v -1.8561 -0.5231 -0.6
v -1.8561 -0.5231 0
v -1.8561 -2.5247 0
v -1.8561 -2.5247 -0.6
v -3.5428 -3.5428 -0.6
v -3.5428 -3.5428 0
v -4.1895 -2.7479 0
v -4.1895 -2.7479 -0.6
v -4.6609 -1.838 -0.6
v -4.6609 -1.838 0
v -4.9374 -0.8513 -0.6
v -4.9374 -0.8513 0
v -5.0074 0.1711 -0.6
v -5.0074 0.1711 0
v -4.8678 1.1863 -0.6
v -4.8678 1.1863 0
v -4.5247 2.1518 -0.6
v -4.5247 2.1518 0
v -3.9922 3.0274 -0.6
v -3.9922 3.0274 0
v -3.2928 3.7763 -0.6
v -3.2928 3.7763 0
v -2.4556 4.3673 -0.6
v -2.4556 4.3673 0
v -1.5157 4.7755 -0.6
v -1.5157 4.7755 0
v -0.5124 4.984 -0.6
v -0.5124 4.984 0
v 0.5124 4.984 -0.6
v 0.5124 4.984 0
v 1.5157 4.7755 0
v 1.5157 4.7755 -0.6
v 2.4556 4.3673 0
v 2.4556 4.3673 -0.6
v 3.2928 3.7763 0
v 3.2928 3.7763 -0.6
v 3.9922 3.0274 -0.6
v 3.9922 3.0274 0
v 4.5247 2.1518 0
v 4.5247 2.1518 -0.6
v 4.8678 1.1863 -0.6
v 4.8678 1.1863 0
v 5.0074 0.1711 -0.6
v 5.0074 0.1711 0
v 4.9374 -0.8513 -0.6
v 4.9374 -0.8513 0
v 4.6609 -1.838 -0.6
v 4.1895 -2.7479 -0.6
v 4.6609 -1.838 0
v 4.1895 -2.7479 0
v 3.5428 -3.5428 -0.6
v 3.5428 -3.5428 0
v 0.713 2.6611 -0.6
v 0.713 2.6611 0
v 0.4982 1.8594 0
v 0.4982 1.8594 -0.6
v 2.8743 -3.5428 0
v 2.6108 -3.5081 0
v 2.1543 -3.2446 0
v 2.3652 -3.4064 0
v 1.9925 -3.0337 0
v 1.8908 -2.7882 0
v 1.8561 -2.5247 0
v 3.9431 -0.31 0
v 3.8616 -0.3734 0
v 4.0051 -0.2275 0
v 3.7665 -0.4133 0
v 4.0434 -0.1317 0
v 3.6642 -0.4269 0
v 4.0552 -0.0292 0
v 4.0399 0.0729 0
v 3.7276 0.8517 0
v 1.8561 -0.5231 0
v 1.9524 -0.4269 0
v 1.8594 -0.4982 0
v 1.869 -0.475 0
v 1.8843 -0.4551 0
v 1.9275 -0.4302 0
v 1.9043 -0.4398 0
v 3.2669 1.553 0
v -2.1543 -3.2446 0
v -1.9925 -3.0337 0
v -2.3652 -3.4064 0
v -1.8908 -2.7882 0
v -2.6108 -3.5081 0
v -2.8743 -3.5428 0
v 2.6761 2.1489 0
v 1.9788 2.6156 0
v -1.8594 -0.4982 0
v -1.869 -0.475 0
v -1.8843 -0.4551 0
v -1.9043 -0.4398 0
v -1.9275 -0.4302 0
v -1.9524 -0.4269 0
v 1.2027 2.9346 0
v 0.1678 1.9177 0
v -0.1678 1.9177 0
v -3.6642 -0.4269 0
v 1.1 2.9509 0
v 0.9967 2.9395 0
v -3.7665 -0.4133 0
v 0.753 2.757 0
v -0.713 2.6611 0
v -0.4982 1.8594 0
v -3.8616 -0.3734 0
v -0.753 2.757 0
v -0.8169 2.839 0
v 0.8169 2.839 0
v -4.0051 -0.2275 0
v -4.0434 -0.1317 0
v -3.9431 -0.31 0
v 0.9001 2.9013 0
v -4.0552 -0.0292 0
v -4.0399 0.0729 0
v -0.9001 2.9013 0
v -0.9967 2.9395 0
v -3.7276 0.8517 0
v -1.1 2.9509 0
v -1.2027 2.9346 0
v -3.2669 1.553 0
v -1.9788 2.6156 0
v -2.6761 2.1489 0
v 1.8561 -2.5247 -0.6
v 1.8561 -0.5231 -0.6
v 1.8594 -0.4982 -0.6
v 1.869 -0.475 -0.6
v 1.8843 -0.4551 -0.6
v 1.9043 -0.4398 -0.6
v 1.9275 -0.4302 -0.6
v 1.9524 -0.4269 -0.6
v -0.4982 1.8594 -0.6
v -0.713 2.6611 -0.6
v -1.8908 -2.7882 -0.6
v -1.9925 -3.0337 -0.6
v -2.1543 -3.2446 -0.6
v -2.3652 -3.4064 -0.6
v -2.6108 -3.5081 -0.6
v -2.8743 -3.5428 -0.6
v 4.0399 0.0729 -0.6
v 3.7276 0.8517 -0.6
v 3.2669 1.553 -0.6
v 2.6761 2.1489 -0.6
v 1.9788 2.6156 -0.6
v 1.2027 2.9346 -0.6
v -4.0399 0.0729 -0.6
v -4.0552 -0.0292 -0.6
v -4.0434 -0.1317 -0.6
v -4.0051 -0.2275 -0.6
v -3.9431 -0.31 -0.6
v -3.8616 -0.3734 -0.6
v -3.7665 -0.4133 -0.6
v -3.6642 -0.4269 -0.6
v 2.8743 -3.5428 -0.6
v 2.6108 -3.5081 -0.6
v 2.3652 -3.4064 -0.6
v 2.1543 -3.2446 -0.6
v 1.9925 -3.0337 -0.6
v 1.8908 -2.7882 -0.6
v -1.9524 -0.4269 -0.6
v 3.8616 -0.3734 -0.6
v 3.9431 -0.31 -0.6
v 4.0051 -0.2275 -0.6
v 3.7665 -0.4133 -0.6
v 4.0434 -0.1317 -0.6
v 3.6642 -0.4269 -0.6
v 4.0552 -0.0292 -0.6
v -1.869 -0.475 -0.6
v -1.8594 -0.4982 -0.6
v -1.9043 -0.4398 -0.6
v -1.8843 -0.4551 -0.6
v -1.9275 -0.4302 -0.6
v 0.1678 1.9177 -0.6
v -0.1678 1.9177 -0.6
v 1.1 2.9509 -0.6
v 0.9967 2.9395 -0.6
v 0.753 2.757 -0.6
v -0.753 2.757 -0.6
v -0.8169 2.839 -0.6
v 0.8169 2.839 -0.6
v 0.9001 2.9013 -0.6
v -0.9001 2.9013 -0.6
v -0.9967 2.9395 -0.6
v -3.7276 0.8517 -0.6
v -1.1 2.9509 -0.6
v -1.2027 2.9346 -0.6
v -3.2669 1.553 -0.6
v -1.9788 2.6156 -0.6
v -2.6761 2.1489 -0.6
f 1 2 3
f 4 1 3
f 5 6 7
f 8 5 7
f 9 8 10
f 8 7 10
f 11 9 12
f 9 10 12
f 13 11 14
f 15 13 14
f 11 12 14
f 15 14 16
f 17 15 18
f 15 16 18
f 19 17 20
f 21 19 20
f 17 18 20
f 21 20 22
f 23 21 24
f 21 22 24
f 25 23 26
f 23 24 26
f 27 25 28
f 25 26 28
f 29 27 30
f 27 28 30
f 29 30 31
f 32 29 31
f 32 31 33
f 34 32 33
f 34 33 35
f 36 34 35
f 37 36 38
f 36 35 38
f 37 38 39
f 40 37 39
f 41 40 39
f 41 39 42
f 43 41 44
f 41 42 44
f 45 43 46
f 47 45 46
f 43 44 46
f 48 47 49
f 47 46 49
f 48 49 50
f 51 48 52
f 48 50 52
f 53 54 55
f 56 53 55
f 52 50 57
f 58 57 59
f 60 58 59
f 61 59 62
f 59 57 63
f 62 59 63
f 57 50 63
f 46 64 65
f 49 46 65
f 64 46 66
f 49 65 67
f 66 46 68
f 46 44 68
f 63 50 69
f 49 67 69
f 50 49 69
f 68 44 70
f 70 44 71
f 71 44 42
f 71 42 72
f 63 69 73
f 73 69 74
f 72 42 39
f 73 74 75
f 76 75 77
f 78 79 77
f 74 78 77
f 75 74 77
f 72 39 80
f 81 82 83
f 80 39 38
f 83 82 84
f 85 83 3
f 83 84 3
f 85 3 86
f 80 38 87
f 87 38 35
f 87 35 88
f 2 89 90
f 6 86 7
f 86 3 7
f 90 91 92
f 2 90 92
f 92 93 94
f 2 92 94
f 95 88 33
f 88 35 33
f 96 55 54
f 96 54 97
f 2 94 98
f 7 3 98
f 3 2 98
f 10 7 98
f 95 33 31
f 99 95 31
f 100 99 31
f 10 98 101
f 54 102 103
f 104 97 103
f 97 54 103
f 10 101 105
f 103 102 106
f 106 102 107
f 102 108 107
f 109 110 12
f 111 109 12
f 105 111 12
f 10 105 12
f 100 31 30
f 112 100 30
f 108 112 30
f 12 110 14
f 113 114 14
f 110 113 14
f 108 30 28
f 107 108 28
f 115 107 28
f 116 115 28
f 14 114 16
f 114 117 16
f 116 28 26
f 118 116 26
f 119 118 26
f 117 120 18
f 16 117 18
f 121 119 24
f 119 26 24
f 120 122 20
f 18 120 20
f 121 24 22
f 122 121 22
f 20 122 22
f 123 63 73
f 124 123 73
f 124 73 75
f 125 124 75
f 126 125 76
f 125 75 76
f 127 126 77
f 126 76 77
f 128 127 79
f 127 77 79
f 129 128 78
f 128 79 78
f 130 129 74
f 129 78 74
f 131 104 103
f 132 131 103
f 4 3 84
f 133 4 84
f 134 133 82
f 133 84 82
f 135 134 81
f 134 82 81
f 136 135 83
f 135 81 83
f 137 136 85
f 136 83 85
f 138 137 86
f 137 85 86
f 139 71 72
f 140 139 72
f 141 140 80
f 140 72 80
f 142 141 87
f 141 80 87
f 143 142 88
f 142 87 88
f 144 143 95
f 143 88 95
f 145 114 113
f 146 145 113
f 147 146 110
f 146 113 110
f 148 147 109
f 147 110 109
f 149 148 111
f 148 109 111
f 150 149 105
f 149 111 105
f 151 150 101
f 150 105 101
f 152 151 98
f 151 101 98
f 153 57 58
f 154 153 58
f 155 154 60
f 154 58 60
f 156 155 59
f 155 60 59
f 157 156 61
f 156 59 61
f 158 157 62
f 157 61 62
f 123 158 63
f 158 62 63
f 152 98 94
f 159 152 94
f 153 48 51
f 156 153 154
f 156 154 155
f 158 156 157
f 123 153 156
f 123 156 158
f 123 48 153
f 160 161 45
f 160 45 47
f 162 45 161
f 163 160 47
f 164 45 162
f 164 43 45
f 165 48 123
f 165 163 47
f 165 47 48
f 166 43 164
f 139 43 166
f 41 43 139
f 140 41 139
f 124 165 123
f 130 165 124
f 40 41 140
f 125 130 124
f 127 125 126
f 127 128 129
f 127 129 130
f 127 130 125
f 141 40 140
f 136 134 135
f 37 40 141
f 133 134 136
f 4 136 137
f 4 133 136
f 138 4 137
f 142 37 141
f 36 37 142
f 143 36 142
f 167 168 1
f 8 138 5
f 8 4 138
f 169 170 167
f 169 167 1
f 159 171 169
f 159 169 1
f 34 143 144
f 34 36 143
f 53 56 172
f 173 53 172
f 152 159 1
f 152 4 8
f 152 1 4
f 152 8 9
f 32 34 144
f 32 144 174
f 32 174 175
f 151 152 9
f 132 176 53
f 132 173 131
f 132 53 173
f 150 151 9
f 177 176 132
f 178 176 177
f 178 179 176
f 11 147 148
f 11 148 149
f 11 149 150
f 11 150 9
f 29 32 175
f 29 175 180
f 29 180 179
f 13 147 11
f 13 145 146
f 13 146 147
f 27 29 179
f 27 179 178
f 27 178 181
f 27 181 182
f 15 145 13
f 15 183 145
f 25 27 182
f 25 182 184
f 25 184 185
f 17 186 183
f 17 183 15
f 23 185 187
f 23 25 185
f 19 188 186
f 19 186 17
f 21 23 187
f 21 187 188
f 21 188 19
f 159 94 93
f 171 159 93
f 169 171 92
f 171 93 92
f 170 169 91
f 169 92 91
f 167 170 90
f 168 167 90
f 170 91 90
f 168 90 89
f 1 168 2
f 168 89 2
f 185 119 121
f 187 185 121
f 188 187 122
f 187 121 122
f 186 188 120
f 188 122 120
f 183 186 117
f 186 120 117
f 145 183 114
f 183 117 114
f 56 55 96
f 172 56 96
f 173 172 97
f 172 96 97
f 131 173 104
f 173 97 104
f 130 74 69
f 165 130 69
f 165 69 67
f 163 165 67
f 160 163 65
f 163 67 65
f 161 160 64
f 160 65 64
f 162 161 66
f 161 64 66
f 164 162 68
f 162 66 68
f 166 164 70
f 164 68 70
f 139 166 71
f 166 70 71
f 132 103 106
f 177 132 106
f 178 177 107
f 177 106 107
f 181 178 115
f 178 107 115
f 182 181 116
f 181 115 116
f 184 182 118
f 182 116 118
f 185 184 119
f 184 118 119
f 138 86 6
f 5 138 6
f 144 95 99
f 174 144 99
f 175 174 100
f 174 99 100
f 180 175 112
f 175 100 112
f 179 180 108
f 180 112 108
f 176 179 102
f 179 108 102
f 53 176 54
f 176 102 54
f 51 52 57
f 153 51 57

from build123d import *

# Parameters (mm, degrees)
BODY_DEPTH = 0.6


with BuildPart() as part:
    # BodySke → Body (new body)
    with BuildSketch(Plane.XY):
        with BuildLine():
            Line((3.542798702, -3.542798702), (2.874267987, -3.542798702))
            ThreePointArc((2.874267987, -3.542798702), (2.154333999, -3.244592279), (1.856127576, -2.524658291))
            Line((1.856127576, -2.524658291), (1.856127576, -0.523137995))
            ThreePointArc((1.856127576, -0.523137995), (1.884318549, -0.455078967), (1.952377576, -0.426887995))
            Line((1.952377576, -0.426887995), (3.664158868, -0.426887995))
            ThreePointArc((3.664158868, -0.426887995), (3.976794043, -0.270800915), (4.039911091, 0.072885231))
            ThreePointArc((4.039911091, 0.072885231), (2.986408887, 1.865726167), (1.202703544, 2.934623154))
            ThreePointArc((1.202703544, 2.934623154), (0.900072735, 2.901285473), (0.713027436, 2.661054618))
            Line((0.713027436, 2.661054618), (0.498226662, 1.859407216))
            ThreePointArc((0.498226662, 1.859407216), (0, 1.925), (-0.498226662, 1.859407216))
            Line((-0.498226662, 1.859407216), (-0.713027436, 2.661054618))
            ThreePointArc((-0.713027436, 2.661054618), (-0.900072735, 2.901285473), (-1.202703544, 2.934623154))
            ThreePointArc((-1.202703544, 2.934623154), (-2.986408887, 1.865726167), (-4.039911091, 0.072885231))
            ThreePointArc((-4.039911091, 0.072885231), (-3.976794043, -0.270800915), (-3.664158868, -0.426887995))
            Line((-3.664158868, -0.426887995), (-1.952377576, -0.426887995))
            ThreePointArc((-1.952377576, -0.426887995), (-1.884318549, -0.455078967), (-1.856127576, -0.523137995))
            Line((-1.856127576, -0.523137995), (-1.856127576, -2.524658291))
            ThreePointArc((-1.856127576, -2.524658291), (-2.154333999, -3.244592279), (-2.874267987, -3.542798702))
            Line((-2.874267987, -3.542798702), (-3.542798702, -3.542798702))
            ThreePointArc((-3.542798702, -3.542798702), (0, 5.010273973), (3.542798702, -3.542798702))
        make_face()
    extrude(amount=-BODY_DEPTH)


solid = part.part
